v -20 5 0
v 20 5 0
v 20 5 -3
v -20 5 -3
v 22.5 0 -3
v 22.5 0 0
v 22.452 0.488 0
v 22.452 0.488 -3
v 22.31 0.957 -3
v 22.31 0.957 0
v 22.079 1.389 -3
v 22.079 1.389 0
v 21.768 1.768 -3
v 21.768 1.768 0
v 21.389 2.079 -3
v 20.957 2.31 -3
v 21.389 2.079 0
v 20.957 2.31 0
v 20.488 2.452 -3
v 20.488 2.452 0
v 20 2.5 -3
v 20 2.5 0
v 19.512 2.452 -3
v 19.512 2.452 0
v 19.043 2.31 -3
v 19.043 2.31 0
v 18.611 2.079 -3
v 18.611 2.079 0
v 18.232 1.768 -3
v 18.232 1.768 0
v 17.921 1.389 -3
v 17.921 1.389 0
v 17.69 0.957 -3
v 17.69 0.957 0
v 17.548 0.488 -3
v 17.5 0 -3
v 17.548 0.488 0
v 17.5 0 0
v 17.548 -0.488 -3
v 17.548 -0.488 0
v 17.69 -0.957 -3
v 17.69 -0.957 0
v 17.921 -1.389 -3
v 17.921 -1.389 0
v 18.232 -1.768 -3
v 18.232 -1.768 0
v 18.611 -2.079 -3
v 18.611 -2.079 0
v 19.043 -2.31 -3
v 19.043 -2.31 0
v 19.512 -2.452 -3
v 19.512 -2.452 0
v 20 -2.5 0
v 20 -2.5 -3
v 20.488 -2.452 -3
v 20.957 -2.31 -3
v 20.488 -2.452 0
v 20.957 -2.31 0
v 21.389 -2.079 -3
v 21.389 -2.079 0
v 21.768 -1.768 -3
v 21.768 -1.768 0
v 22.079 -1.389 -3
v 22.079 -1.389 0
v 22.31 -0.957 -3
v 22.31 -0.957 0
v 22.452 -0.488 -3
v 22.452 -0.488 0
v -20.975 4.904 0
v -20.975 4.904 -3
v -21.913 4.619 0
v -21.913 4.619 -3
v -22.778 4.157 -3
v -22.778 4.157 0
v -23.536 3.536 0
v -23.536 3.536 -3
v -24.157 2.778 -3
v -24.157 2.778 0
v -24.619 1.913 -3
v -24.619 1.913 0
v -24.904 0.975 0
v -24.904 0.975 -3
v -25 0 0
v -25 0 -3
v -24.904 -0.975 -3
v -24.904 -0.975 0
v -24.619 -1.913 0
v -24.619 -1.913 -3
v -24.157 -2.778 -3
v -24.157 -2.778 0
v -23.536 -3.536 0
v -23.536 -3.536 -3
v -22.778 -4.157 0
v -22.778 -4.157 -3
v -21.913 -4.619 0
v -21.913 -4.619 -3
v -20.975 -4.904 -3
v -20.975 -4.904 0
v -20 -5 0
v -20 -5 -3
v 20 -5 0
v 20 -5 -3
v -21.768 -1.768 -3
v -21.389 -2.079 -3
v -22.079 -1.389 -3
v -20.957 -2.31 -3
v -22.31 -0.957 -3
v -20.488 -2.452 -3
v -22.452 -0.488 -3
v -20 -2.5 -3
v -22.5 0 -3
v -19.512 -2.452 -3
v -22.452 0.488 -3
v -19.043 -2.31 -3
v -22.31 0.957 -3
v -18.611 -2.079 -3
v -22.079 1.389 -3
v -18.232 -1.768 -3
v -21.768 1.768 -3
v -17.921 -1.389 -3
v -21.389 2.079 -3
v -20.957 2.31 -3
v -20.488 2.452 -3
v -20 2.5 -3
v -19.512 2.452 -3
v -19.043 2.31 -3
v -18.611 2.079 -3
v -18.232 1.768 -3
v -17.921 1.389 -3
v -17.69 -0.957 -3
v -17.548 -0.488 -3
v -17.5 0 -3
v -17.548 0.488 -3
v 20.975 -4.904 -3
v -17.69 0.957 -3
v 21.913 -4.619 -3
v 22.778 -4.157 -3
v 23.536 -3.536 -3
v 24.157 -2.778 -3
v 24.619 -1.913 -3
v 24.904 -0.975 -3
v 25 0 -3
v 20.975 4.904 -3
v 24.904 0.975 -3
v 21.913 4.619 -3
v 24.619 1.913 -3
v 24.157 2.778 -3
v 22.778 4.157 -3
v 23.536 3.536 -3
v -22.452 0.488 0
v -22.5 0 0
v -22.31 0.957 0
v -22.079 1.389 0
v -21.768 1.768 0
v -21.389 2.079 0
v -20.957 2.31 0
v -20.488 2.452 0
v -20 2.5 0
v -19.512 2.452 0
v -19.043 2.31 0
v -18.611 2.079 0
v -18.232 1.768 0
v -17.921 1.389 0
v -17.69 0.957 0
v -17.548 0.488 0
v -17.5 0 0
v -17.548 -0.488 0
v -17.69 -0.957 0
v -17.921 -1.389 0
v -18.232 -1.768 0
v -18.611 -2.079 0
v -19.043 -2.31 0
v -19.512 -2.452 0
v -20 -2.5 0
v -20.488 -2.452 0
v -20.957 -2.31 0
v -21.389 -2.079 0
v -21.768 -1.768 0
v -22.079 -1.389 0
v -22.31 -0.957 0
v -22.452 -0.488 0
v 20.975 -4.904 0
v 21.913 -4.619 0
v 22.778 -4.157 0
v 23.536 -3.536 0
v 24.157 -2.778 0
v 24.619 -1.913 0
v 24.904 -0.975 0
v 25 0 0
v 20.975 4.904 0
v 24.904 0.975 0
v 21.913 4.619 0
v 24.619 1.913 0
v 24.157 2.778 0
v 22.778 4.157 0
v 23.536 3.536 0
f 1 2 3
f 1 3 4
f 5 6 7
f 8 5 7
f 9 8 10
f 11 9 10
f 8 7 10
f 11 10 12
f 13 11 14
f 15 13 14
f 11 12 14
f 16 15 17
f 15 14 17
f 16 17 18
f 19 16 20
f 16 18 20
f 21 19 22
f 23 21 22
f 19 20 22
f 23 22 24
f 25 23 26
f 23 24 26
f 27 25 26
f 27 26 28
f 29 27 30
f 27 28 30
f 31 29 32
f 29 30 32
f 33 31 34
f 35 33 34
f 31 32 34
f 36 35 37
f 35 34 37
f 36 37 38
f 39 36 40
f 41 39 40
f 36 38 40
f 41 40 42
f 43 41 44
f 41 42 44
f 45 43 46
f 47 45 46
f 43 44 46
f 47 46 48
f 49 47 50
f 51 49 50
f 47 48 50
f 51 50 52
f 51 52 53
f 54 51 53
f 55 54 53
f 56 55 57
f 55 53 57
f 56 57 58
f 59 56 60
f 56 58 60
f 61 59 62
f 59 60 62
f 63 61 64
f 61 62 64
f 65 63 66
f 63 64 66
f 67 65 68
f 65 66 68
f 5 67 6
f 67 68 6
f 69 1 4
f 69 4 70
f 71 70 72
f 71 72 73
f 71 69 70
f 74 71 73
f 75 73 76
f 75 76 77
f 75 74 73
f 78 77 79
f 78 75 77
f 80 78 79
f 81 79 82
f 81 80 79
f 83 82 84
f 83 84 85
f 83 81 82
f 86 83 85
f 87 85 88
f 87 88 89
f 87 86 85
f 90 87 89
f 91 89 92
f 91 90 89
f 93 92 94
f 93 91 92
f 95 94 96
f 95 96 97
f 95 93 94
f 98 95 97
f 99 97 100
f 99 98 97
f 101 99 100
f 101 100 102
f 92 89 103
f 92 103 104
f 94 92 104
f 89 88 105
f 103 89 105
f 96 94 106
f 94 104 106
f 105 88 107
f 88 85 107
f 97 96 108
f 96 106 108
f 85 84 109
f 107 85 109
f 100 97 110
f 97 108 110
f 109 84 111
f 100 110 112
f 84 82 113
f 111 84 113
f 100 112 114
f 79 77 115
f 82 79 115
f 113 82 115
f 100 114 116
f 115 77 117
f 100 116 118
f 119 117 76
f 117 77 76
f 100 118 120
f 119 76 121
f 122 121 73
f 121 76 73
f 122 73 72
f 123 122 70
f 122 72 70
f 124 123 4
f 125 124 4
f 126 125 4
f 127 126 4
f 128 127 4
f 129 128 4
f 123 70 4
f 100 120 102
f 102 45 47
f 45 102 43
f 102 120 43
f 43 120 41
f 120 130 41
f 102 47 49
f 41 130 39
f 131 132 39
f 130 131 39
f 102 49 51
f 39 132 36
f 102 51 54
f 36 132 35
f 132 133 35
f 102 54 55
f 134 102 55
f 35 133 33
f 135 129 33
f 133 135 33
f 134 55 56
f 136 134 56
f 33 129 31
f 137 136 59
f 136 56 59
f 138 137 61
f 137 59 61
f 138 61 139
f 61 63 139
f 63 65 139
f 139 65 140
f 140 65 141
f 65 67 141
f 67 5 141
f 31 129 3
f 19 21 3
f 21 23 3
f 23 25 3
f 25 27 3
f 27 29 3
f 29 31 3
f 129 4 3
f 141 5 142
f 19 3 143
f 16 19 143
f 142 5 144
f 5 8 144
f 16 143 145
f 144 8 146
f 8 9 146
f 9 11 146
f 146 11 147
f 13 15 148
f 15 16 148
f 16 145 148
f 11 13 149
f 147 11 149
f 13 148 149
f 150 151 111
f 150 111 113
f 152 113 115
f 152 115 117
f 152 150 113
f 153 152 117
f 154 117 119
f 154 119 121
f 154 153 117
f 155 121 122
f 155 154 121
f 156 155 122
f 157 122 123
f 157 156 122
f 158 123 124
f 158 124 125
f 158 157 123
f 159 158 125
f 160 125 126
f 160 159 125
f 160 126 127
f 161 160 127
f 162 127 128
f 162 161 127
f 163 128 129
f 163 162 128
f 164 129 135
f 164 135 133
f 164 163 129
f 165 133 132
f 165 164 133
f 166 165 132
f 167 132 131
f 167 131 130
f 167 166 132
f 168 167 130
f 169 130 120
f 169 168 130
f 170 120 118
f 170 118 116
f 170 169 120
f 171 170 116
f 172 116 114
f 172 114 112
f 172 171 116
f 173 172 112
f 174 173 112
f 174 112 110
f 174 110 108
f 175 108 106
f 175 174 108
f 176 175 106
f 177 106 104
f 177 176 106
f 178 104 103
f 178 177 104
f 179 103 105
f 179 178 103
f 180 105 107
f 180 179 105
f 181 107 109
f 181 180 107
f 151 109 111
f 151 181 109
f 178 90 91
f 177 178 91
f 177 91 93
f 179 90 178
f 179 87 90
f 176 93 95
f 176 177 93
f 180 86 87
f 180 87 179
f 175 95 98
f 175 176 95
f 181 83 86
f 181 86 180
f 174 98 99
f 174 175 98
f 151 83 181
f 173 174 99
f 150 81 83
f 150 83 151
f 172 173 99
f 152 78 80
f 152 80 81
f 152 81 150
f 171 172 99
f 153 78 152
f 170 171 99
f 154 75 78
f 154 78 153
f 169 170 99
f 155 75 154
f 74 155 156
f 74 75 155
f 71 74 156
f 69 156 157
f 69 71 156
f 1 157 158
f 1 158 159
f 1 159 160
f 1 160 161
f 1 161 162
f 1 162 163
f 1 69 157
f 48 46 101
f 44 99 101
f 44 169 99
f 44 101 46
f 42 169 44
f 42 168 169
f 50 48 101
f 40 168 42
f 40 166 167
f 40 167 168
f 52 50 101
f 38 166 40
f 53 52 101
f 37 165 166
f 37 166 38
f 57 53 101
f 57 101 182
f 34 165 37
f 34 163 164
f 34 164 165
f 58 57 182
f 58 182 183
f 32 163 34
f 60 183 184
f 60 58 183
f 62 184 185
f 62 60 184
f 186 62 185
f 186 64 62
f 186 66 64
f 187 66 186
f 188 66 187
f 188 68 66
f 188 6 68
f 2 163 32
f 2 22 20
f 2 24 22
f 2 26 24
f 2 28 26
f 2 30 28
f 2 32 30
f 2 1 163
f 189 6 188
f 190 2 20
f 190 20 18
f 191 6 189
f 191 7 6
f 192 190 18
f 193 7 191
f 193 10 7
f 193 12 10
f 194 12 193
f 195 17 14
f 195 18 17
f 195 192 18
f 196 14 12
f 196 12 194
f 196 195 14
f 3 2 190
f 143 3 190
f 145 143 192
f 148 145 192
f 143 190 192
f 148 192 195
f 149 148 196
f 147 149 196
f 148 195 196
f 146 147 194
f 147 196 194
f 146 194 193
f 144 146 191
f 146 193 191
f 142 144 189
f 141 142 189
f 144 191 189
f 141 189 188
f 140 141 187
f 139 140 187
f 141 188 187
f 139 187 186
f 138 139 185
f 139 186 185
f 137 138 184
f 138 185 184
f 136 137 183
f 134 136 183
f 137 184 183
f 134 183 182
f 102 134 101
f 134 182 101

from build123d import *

# Parameters (mm, degrees)
SKETCH19_W          = 20
SKETCH19_H          = 10
BOSS_EXTRUDE4_DEPTH = 3
SKETCH22_R          = 2.5
BOSS_EXTRUDE5_DEPTH = 3


with BuildPart() as part:
    # Sketch19 → Boss-Extrude4 (new body)
    with BuildSketch(Plane.XY):
        Rectangle(SKETCH19_W, SKETCH19_H)
    boss_extrude4 = extrude(amount=-BOSS_EXTRUDE4_DEPTH)

    # Sketch22 → Boss-Extrude5 (add)
    with BuildSketch(Plane.XY):
        with BuildLine():
            Line((10, 5), (20, 5))
            ThreePointArc((20, 5), (25, 0), (20, -5))
            Line((20, -5), (10, -5))
            Line((10, -5), (10, 5))
        make_face()
        with Locations((20, 0)):
            Circle(SKETCH22_R, mode=Mode.SUBTRACT)
    boss_extrude5 = extrude(amount=-BOSS_EXTRUDE5_DEPTH)

    # Mirror2: Boss-Extrude4, Boss-Extrude5 across plane
    add(boss_extrude4.mirror(Plane.ZY))
    add(boss_extrude5.mirror(Plane.ZY))


solid = part.part
